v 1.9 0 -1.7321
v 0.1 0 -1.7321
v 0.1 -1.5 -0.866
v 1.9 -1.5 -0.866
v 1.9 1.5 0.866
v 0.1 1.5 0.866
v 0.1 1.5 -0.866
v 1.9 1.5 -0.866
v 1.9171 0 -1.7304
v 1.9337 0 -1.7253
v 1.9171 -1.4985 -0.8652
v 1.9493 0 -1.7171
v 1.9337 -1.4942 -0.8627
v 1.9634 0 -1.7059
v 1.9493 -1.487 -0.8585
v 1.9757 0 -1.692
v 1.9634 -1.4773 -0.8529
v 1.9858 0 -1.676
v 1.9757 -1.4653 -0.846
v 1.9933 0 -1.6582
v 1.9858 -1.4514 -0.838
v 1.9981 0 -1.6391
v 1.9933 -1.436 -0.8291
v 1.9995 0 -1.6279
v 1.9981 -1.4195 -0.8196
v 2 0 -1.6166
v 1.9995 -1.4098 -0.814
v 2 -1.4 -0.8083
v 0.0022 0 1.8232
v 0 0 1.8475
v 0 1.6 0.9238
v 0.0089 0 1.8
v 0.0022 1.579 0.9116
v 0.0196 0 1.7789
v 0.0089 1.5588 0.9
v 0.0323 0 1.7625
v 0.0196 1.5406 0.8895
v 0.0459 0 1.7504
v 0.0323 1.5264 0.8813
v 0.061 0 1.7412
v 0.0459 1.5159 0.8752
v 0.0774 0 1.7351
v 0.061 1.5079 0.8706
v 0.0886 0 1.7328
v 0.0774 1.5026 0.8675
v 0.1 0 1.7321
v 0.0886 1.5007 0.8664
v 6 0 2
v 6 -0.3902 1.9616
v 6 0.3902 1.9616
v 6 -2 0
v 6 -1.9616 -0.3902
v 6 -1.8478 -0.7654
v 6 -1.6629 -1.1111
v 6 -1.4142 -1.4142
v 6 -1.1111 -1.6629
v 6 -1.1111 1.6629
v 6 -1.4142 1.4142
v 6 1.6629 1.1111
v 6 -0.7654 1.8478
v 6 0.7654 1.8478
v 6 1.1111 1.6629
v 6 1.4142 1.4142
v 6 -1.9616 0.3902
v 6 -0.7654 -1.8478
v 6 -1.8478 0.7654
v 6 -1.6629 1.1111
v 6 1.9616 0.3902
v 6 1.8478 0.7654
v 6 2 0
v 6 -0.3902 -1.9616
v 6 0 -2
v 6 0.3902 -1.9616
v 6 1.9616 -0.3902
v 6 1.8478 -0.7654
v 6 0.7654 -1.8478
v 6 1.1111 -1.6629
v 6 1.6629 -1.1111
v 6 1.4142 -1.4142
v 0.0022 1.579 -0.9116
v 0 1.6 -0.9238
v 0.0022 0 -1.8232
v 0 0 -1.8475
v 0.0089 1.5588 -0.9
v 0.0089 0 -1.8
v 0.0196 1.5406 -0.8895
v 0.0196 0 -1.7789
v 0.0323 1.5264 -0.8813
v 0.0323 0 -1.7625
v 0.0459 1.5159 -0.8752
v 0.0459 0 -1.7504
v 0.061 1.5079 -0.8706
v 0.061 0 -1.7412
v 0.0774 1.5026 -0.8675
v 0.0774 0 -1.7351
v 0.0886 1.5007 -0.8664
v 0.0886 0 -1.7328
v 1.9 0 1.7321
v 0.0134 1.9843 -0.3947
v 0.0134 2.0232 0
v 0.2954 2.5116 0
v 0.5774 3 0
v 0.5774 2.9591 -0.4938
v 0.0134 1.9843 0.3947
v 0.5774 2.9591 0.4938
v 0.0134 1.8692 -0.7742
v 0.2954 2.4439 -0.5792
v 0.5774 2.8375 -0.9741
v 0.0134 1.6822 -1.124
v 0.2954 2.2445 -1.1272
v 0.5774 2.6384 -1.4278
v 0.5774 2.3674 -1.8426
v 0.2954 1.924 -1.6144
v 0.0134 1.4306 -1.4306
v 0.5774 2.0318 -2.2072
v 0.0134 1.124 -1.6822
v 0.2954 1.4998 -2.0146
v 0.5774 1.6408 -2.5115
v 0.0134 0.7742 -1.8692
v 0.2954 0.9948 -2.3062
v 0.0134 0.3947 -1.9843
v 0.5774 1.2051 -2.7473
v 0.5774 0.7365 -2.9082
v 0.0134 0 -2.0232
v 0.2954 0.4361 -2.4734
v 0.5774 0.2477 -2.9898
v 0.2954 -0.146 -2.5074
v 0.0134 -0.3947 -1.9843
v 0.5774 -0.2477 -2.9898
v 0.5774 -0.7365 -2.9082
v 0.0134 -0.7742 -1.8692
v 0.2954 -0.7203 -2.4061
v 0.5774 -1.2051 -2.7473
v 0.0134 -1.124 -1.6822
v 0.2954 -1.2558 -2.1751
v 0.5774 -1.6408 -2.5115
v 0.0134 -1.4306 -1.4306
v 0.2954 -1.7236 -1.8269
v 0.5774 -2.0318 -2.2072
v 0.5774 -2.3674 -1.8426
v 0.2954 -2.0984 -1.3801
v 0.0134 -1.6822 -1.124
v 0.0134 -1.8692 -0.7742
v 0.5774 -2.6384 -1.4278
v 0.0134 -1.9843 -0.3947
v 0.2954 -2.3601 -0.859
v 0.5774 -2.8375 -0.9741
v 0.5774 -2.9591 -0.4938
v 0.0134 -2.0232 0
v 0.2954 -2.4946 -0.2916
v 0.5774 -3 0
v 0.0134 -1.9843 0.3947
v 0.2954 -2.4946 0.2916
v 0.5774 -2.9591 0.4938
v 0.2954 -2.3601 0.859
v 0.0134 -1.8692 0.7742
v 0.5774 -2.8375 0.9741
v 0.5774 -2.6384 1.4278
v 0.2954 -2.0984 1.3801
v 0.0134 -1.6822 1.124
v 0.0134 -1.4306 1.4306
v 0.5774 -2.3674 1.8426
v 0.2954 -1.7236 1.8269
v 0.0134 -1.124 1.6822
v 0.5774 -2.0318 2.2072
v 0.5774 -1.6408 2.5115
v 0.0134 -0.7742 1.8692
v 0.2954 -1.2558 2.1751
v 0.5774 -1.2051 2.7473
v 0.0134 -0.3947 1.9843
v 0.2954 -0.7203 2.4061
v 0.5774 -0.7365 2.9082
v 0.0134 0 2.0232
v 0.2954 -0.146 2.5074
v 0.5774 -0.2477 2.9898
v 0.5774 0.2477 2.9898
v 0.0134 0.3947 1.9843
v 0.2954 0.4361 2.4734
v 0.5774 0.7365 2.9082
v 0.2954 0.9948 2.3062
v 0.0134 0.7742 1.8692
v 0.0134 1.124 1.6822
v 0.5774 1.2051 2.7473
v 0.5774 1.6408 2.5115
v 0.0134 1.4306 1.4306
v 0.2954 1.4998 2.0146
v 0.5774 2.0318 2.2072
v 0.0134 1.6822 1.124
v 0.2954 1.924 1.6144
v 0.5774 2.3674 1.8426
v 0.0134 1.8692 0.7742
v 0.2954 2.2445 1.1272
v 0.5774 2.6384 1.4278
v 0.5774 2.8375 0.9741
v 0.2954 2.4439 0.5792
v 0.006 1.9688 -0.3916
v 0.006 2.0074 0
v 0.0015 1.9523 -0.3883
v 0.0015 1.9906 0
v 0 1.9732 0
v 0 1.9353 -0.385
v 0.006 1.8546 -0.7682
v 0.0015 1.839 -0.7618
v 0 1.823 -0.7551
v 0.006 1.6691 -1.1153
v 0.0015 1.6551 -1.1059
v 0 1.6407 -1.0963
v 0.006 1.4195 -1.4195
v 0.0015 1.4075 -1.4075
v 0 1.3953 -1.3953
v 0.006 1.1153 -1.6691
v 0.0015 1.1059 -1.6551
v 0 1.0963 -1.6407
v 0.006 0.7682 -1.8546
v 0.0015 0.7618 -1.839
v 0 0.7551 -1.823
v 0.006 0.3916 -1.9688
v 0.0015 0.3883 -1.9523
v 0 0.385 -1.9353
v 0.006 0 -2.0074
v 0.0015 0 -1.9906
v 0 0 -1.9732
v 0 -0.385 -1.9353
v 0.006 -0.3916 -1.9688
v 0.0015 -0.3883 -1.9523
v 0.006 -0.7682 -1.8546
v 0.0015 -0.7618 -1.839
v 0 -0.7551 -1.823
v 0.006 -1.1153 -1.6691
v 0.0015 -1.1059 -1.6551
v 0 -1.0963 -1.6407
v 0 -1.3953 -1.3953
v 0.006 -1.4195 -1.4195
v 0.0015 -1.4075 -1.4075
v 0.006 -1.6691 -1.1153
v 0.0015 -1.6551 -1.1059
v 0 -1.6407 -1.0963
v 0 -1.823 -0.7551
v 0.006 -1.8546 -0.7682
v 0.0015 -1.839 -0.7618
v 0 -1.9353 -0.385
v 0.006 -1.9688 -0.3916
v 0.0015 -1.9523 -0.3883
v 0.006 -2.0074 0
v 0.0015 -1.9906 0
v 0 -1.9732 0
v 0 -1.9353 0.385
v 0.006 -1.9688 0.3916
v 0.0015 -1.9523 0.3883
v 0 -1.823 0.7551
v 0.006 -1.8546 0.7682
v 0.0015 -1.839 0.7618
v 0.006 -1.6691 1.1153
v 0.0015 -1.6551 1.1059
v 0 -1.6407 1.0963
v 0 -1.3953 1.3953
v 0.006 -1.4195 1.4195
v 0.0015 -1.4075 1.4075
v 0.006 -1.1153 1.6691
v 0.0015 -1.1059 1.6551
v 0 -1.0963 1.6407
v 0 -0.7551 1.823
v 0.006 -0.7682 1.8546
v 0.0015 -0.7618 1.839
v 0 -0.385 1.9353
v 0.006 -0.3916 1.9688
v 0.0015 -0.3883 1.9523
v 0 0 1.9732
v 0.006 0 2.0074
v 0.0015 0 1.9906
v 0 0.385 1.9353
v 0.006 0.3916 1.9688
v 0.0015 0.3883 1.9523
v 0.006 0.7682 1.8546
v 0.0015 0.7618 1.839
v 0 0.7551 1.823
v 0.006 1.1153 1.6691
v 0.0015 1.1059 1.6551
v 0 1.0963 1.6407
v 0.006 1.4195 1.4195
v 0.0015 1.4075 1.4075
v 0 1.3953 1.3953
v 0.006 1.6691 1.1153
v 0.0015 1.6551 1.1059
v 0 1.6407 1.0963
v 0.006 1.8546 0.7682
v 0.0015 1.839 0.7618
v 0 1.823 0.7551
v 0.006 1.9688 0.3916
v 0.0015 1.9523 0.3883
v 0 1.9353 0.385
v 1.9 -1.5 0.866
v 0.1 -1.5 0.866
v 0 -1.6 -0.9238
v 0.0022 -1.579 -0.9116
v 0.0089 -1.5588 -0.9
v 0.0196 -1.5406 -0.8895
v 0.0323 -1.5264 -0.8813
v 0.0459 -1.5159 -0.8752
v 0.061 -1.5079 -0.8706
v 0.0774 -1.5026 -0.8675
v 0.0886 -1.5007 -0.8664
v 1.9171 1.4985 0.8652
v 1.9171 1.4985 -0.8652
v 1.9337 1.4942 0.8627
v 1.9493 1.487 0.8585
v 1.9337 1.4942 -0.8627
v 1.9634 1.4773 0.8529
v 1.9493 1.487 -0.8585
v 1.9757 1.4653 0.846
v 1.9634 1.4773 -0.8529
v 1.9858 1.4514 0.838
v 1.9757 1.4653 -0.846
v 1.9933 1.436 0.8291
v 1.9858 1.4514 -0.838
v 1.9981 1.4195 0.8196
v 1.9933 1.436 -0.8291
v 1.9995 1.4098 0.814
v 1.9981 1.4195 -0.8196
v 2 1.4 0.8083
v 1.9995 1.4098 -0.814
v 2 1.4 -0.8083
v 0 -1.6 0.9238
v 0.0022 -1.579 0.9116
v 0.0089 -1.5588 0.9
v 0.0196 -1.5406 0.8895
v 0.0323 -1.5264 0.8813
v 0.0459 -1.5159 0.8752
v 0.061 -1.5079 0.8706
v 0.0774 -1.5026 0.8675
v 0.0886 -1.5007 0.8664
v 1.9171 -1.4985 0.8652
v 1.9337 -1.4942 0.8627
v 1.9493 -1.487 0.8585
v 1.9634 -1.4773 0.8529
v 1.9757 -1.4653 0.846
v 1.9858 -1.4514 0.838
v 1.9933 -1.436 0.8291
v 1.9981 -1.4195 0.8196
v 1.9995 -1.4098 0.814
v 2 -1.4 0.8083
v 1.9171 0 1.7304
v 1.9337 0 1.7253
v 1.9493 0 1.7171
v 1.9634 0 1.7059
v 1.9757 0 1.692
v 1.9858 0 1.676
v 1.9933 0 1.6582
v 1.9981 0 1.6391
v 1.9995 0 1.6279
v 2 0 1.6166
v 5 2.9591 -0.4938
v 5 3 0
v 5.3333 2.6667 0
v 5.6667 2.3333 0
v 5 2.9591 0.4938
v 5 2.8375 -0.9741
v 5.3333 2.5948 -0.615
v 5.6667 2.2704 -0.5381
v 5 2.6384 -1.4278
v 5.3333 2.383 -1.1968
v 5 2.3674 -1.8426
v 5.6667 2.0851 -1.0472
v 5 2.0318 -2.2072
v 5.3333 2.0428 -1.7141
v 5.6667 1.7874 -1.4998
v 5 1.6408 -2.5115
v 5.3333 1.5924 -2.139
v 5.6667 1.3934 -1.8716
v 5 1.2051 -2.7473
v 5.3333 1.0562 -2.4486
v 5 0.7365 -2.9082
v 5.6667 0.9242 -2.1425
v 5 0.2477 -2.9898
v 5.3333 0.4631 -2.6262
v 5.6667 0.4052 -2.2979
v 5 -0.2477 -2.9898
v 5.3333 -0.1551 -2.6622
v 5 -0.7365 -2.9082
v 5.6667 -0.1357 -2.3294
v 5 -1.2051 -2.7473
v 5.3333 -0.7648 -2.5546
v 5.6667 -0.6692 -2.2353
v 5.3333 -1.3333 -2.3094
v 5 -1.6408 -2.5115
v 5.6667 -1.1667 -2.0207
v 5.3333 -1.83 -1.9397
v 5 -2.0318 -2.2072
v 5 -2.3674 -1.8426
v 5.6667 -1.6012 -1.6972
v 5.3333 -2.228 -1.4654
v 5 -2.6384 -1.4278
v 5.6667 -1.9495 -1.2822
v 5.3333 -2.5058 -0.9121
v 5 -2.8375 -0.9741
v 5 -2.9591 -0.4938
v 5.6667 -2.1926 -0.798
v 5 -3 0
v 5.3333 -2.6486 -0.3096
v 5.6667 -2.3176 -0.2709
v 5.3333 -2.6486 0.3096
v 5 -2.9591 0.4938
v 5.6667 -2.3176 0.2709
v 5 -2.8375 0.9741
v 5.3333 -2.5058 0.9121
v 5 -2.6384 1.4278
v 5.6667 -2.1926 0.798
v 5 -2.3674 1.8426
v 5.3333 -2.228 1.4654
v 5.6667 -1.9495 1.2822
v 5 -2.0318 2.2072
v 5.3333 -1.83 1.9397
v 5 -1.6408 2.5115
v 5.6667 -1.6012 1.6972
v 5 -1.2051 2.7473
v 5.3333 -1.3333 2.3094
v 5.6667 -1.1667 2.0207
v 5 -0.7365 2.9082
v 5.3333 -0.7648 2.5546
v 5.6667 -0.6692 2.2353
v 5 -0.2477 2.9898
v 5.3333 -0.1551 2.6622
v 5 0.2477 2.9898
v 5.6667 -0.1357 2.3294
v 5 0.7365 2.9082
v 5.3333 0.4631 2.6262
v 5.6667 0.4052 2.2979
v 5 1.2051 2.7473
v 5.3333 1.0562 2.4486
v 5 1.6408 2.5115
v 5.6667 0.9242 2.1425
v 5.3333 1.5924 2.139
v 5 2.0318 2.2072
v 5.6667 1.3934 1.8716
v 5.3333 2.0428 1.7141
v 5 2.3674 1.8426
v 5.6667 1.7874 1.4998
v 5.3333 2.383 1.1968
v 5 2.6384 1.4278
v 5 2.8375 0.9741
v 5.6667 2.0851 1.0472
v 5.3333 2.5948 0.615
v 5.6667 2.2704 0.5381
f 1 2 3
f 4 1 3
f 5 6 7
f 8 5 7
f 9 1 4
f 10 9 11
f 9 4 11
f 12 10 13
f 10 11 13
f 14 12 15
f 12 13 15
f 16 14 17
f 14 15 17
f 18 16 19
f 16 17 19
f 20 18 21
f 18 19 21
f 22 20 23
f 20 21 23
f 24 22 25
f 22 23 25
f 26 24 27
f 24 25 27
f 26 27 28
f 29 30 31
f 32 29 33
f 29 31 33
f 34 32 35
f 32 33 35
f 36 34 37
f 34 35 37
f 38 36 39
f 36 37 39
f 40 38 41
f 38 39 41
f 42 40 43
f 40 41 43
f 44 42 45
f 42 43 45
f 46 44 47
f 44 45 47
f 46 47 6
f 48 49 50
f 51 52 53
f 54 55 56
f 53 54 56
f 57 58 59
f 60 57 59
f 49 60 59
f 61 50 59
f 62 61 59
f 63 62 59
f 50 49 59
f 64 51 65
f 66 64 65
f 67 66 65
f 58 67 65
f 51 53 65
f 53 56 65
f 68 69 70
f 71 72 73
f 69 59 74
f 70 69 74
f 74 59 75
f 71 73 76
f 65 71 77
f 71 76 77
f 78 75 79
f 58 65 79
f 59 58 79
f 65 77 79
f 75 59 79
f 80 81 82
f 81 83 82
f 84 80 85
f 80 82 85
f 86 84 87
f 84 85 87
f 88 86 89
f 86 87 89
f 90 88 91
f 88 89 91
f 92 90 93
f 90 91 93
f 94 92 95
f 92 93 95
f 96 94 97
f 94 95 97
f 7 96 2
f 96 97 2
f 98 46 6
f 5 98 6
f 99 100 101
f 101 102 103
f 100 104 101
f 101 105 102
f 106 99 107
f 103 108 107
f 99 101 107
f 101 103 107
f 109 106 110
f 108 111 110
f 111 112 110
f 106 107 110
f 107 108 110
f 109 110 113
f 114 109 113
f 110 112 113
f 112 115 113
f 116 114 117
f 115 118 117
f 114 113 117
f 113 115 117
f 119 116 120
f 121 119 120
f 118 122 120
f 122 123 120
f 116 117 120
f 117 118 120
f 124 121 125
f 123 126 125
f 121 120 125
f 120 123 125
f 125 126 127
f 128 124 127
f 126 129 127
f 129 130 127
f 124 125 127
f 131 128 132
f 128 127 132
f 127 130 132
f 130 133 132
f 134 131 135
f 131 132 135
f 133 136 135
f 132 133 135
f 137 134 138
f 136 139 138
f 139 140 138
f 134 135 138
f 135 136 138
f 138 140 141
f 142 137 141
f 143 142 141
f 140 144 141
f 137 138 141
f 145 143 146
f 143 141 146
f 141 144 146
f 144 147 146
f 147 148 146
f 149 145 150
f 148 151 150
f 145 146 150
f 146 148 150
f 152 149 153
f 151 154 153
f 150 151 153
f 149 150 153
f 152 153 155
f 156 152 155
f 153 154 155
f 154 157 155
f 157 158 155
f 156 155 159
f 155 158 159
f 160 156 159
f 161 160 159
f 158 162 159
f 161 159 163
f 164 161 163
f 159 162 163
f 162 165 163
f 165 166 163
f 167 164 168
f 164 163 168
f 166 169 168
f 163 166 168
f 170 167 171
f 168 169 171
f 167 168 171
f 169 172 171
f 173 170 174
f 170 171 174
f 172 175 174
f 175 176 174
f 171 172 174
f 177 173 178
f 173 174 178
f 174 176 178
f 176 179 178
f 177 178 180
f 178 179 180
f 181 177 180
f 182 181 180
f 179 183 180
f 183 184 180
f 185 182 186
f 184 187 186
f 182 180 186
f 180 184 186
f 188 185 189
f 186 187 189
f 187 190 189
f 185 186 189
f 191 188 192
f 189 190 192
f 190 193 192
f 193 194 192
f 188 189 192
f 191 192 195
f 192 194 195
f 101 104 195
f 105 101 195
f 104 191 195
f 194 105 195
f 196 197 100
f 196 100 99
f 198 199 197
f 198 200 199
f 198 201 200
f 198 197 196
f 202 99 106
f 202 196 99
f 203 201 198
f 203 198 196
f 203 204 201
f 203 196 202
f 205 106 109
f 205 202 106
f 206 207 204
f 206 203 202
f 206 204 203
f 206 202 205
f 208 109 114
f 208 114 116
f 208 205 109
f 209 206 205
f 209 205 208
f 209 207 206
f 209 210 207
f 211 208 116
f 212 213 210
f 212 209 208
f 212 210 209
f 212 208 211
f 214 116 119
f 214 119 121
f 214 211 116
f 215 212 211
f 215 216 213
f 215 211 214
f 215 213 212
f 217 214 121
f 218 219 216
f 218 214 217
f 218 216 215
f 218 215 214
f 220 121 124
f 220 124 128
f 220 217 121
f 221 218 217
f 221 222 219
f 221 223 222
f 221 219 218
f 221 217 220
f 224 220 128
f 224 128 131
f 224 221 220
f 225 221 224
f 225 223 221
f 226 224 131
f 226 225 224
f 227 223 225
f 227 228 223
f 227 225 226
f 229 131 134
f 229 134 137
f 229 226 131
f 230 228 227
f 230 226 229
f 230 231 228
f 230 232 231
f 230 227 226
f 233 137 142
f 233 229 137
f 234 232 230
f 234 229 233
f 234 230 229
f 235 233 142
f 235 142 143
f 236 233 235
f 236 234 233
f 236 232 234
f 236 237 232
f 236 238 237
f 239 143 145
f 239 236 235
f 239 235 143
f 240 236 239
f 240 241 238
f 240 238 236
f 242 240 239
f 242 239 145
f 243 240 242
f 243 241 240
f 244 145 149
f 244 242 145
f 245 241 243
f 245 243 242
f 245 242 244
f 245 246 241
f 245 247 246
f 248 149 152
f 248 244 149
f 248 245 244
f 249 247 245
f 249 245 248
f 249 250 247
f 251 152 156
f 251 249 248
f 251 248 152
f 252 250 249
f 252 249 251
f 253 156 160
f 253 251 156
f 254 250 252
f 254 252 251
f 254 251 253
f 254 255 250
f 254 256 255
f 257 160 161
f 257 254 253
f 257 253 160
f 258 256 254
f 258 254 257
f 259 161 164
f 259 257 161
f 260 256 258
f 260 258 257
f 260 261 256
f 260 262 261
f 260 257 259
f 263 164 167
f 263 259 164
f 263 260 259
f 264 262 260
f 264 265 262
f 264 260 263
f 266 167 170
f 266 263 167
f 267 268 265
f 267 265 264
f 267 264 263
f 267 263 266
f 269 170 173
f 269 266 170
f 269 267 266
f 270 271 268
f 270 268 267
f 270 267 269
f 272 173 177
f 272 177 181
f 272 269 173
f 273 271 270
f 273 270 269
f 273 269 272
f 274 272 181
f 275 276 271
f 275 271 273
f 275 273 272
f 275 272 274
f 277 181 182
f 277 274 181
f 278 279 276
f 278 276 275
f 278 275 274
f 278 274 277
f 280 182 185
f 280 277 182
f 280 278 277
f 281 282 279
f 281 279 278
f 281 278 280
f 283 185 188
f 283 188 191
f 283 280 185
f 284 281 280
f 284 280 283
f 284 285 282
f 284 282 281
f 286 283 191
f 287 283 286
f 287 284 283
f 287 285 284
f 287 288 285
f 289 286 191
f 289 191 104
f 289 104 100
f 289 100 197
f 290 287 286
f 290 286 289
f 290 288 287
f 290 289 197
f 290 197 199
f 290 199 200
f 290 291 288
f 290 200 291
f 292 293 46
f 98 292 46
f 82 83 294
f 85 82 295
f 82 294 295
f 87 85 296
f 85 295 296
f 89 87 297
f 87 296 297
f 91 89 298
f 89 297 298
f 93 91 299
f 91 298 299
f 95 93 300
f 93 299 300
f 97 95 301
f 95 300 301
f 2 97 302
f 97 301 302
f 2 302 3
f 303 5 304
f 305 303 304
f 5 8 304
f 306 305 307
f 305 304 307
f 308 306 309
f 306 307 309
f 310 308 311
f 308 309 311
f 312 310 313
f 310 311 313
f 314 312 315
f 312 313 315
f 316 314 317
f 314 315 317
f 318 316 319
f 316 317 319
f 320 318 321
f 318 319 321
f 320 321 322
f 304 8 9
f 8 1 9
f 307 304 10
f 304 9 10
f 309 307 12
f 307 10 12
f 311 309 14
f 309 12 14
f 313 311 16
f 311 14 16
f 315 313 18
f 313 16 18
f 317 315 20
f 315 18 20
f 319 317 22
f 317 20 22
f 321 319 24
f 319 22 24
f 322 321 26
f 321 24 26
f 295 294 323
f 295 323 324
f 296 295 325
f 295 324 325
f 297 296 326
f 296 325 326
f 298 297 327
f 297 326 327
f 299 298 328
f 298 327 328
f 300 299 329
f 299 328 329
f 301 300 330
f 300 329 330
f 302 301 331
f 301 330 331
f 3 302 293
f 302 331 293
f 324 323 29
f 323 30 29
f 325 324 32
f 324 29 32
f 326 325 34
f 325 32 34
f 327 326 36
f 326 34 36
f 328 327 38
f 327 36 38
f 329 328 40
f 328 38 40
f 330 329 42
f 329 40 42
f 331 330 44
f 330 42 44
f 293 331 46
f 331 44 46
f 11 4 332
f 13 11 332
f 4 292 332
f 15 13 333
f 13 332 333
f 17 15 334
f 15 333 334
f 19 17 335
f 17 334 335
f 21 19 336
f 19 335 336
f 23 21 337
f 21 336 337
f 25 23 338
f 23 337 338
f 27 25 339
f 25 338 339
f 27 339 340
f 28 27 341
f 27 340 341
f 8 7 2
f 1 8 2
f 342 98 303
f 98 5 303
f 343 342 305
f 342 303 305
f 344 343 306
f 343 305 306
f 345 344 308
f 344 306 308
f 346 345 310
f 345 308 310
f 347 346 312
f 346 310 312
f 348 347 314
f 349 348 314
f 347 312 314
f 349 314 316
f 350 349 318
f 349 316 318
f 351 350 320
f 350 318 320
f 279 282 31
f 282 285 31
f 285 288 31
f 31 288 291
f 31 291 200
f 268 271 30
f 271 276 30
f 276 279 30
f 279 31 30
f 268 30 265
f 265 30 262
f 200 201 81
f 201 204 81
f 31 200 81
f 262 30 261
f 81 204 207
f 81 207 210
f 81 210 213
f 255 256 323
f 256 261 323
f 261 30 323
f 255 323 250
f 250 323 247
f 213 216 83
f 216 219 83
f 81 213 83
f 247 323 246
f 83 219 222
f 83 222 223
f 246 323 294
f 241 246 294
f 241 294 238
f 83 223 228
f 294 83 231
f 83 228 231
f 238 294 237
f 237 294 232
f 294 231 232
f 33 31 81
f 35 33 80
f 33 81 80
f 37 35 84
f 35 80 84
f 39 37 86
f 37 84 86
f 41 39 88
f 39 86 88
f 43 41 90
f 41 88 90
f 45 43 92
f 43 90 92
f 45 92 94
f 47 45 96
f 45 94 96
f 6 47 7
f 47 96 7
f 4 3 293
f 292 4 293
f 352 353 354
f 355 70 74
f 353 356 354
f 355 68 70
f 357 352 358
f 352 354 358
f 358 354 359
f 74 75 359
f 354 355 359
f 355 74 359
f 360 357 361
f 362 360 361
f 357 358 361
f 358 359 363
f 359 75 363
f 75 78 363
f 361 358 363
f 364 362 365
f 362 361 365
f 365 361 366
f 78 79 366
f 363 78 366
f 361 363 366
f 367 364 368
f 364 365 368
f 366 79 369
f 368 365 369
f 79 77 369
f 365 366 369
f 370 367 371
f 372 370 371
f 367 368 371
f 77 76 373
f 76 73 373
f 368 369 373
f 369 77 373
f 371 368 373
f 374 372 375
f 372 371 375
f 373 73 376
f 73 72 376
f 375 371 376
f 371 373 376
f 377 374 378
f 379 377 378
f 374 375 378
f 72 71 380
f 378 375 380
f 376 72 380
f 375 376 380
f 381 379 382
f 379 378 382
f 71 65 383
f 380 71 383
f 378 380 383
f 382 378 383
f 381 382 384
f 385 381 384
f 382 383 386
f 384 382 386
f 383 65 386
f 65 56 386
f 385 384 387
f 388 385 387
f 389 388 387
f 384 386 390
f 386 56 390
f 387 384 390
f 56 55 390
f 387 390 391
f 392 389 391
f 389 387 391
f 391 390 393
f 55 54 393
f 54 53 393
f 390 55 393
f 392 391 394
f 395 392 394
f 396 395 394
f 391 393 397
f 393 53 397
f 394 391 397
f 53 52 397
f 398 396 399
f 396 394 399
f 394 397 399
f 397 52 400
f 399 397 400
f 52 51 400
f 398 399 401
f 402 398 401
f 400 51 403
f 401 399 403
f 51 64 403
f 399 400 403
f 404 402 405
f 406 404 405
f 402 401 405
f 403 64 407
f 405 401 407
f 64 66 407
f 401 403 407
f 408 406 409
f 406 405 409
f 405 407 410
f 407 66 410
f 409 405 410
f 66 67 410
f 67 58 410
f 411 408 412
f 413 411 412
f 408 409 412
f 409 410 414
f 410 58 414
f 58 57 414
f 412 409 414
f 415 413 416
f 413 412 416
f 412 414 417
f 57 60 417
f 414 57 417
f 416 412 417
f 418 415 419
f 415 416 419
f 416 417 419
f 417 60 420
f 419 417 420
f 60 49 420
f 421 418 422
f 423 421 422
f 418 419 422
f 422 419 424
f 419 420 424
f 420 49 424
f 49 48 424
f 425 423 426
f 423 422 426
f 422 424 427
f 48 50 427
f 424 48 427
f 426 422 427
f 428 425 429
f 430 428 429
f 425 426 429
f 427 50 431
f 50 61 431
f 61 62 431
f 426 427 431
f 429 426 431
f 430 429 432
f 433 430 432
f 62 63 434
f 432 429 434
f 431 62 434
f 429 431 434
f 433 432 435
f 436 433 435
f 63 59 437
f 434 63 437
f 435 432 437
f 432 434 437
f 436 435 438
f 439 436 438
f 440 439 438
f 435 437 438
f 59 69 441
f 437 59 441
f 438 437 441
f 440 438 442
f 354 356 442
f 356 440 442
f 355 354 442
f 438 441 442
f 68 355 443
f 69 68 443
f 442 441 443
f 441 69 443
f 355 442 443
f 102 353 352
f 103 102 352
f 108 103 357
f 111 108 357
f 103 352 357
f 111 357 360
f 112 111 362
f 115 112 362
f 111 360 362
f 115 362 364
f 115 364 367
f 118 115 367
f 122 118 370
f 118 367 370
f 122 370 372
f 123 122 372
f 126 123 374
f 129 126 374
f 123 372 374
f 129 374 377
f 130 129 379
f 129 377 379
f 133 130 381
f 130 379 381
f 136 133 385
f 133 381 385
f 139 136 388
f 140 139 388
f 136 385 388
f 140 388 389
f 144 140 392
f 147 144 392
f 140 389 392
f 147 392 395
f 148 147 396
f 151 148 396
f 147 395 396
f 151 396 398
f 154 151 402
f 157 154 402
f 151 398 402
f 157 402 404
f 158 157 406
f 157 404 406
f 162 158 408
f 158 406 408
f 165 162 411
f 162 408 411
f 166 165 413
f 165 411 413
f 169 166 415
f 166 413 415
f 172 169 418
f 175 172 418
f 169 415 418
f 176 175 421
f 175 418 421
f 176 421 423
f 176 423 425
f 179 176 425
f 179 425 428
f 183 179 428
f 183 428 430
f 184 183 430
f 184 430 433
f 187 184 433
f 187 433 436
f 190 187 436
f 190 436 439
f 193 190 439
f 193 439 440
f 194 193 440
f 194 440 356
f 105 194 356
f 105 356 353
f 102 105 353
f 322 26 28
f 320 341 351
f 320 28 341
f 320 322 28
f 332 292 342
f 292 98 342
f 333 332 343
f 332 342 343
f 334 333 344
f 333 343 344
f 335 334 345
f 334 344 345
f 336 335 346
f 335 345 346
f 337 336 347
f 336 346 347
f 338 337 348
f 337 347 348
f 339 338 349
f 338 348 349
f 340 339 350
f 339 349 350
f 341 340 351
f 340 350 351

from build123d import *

# Parameters (mm, degrees)
CUT_EXTRUDE_1_DEPTH = 2
CHAMFER_1_SIZE      = 1
CHAMFER_1_SIZE2     = 0.577350269
FILLET_1_R          = 0.1


with BuildPart() as part:
    # Эскиз1 → Повернуть1 (revolve)
    with BuildSketch(Plane(origin=(0, 0, 0), x_dir=(-1, 0, 0), z_dir=(0, 0, -1))):
        Polygon((-6, 2), (-6, 0), (0, 0), (0, 3), (-5, 3), align=None)
    revolve(axis=Axis((6, 0, 0), (-1, 0, 0)))

    # Эскиз2 → Вырез-Вытянуть1 (cut)
    with BuildSketch(Plane.ZY):
        Polygon((1.732050808, 0), (0.866025404, 1.5), (-0.866025404, 1.5), (-1.732050808, 0), (-0.866025404, -1.5), (0.866025404, -1.5), align=None)
    extrude(amount=-CUT_EXTRUDE_1_DEPTH, mode=Mode.SUBTRACT)

    # Фаска1
    chamfer_1_edges = [part.edges().sort_by_distance(p)[0] for p in [
        (0, -3, 0),
    ]]
    chamfer_1_side = [part.faces().sort_by_distance(p)[0] for p in [
        (0, -2.915147186, 0),
    ]]
    chamfer(chamfer_1_edges, length=CHAMFER_1_SIZE, length2=CHAMFER_1_SIZE2, reference=chamfer_1_side[0])

    # Скругление1
    fillet_1_edges = [part.edges().sort_by_distance(p)[0] for p in [
        (2, -0.75, 1.299038106),
        (2, -1.5, 0),
        (2, -0.75, -1.299038106),
        (2, 0.75, -1.299038106),
        (2, 1.5, 0),
        (2, 0.75, 1.299038106),
        (0, -0.75, 1.299038106),
        (0, 0.75, 1.299038106),
        (0, 1.5, 0),
        (0, 0.75, -1.299038106),
        (0, -0.75, -1.299038106),
        (0, -1.5, 0),
        (0, -2, 0),
    ]]
    fillet(fillet_1_edges, radius=FILLET_1_R)


solid = part.part
